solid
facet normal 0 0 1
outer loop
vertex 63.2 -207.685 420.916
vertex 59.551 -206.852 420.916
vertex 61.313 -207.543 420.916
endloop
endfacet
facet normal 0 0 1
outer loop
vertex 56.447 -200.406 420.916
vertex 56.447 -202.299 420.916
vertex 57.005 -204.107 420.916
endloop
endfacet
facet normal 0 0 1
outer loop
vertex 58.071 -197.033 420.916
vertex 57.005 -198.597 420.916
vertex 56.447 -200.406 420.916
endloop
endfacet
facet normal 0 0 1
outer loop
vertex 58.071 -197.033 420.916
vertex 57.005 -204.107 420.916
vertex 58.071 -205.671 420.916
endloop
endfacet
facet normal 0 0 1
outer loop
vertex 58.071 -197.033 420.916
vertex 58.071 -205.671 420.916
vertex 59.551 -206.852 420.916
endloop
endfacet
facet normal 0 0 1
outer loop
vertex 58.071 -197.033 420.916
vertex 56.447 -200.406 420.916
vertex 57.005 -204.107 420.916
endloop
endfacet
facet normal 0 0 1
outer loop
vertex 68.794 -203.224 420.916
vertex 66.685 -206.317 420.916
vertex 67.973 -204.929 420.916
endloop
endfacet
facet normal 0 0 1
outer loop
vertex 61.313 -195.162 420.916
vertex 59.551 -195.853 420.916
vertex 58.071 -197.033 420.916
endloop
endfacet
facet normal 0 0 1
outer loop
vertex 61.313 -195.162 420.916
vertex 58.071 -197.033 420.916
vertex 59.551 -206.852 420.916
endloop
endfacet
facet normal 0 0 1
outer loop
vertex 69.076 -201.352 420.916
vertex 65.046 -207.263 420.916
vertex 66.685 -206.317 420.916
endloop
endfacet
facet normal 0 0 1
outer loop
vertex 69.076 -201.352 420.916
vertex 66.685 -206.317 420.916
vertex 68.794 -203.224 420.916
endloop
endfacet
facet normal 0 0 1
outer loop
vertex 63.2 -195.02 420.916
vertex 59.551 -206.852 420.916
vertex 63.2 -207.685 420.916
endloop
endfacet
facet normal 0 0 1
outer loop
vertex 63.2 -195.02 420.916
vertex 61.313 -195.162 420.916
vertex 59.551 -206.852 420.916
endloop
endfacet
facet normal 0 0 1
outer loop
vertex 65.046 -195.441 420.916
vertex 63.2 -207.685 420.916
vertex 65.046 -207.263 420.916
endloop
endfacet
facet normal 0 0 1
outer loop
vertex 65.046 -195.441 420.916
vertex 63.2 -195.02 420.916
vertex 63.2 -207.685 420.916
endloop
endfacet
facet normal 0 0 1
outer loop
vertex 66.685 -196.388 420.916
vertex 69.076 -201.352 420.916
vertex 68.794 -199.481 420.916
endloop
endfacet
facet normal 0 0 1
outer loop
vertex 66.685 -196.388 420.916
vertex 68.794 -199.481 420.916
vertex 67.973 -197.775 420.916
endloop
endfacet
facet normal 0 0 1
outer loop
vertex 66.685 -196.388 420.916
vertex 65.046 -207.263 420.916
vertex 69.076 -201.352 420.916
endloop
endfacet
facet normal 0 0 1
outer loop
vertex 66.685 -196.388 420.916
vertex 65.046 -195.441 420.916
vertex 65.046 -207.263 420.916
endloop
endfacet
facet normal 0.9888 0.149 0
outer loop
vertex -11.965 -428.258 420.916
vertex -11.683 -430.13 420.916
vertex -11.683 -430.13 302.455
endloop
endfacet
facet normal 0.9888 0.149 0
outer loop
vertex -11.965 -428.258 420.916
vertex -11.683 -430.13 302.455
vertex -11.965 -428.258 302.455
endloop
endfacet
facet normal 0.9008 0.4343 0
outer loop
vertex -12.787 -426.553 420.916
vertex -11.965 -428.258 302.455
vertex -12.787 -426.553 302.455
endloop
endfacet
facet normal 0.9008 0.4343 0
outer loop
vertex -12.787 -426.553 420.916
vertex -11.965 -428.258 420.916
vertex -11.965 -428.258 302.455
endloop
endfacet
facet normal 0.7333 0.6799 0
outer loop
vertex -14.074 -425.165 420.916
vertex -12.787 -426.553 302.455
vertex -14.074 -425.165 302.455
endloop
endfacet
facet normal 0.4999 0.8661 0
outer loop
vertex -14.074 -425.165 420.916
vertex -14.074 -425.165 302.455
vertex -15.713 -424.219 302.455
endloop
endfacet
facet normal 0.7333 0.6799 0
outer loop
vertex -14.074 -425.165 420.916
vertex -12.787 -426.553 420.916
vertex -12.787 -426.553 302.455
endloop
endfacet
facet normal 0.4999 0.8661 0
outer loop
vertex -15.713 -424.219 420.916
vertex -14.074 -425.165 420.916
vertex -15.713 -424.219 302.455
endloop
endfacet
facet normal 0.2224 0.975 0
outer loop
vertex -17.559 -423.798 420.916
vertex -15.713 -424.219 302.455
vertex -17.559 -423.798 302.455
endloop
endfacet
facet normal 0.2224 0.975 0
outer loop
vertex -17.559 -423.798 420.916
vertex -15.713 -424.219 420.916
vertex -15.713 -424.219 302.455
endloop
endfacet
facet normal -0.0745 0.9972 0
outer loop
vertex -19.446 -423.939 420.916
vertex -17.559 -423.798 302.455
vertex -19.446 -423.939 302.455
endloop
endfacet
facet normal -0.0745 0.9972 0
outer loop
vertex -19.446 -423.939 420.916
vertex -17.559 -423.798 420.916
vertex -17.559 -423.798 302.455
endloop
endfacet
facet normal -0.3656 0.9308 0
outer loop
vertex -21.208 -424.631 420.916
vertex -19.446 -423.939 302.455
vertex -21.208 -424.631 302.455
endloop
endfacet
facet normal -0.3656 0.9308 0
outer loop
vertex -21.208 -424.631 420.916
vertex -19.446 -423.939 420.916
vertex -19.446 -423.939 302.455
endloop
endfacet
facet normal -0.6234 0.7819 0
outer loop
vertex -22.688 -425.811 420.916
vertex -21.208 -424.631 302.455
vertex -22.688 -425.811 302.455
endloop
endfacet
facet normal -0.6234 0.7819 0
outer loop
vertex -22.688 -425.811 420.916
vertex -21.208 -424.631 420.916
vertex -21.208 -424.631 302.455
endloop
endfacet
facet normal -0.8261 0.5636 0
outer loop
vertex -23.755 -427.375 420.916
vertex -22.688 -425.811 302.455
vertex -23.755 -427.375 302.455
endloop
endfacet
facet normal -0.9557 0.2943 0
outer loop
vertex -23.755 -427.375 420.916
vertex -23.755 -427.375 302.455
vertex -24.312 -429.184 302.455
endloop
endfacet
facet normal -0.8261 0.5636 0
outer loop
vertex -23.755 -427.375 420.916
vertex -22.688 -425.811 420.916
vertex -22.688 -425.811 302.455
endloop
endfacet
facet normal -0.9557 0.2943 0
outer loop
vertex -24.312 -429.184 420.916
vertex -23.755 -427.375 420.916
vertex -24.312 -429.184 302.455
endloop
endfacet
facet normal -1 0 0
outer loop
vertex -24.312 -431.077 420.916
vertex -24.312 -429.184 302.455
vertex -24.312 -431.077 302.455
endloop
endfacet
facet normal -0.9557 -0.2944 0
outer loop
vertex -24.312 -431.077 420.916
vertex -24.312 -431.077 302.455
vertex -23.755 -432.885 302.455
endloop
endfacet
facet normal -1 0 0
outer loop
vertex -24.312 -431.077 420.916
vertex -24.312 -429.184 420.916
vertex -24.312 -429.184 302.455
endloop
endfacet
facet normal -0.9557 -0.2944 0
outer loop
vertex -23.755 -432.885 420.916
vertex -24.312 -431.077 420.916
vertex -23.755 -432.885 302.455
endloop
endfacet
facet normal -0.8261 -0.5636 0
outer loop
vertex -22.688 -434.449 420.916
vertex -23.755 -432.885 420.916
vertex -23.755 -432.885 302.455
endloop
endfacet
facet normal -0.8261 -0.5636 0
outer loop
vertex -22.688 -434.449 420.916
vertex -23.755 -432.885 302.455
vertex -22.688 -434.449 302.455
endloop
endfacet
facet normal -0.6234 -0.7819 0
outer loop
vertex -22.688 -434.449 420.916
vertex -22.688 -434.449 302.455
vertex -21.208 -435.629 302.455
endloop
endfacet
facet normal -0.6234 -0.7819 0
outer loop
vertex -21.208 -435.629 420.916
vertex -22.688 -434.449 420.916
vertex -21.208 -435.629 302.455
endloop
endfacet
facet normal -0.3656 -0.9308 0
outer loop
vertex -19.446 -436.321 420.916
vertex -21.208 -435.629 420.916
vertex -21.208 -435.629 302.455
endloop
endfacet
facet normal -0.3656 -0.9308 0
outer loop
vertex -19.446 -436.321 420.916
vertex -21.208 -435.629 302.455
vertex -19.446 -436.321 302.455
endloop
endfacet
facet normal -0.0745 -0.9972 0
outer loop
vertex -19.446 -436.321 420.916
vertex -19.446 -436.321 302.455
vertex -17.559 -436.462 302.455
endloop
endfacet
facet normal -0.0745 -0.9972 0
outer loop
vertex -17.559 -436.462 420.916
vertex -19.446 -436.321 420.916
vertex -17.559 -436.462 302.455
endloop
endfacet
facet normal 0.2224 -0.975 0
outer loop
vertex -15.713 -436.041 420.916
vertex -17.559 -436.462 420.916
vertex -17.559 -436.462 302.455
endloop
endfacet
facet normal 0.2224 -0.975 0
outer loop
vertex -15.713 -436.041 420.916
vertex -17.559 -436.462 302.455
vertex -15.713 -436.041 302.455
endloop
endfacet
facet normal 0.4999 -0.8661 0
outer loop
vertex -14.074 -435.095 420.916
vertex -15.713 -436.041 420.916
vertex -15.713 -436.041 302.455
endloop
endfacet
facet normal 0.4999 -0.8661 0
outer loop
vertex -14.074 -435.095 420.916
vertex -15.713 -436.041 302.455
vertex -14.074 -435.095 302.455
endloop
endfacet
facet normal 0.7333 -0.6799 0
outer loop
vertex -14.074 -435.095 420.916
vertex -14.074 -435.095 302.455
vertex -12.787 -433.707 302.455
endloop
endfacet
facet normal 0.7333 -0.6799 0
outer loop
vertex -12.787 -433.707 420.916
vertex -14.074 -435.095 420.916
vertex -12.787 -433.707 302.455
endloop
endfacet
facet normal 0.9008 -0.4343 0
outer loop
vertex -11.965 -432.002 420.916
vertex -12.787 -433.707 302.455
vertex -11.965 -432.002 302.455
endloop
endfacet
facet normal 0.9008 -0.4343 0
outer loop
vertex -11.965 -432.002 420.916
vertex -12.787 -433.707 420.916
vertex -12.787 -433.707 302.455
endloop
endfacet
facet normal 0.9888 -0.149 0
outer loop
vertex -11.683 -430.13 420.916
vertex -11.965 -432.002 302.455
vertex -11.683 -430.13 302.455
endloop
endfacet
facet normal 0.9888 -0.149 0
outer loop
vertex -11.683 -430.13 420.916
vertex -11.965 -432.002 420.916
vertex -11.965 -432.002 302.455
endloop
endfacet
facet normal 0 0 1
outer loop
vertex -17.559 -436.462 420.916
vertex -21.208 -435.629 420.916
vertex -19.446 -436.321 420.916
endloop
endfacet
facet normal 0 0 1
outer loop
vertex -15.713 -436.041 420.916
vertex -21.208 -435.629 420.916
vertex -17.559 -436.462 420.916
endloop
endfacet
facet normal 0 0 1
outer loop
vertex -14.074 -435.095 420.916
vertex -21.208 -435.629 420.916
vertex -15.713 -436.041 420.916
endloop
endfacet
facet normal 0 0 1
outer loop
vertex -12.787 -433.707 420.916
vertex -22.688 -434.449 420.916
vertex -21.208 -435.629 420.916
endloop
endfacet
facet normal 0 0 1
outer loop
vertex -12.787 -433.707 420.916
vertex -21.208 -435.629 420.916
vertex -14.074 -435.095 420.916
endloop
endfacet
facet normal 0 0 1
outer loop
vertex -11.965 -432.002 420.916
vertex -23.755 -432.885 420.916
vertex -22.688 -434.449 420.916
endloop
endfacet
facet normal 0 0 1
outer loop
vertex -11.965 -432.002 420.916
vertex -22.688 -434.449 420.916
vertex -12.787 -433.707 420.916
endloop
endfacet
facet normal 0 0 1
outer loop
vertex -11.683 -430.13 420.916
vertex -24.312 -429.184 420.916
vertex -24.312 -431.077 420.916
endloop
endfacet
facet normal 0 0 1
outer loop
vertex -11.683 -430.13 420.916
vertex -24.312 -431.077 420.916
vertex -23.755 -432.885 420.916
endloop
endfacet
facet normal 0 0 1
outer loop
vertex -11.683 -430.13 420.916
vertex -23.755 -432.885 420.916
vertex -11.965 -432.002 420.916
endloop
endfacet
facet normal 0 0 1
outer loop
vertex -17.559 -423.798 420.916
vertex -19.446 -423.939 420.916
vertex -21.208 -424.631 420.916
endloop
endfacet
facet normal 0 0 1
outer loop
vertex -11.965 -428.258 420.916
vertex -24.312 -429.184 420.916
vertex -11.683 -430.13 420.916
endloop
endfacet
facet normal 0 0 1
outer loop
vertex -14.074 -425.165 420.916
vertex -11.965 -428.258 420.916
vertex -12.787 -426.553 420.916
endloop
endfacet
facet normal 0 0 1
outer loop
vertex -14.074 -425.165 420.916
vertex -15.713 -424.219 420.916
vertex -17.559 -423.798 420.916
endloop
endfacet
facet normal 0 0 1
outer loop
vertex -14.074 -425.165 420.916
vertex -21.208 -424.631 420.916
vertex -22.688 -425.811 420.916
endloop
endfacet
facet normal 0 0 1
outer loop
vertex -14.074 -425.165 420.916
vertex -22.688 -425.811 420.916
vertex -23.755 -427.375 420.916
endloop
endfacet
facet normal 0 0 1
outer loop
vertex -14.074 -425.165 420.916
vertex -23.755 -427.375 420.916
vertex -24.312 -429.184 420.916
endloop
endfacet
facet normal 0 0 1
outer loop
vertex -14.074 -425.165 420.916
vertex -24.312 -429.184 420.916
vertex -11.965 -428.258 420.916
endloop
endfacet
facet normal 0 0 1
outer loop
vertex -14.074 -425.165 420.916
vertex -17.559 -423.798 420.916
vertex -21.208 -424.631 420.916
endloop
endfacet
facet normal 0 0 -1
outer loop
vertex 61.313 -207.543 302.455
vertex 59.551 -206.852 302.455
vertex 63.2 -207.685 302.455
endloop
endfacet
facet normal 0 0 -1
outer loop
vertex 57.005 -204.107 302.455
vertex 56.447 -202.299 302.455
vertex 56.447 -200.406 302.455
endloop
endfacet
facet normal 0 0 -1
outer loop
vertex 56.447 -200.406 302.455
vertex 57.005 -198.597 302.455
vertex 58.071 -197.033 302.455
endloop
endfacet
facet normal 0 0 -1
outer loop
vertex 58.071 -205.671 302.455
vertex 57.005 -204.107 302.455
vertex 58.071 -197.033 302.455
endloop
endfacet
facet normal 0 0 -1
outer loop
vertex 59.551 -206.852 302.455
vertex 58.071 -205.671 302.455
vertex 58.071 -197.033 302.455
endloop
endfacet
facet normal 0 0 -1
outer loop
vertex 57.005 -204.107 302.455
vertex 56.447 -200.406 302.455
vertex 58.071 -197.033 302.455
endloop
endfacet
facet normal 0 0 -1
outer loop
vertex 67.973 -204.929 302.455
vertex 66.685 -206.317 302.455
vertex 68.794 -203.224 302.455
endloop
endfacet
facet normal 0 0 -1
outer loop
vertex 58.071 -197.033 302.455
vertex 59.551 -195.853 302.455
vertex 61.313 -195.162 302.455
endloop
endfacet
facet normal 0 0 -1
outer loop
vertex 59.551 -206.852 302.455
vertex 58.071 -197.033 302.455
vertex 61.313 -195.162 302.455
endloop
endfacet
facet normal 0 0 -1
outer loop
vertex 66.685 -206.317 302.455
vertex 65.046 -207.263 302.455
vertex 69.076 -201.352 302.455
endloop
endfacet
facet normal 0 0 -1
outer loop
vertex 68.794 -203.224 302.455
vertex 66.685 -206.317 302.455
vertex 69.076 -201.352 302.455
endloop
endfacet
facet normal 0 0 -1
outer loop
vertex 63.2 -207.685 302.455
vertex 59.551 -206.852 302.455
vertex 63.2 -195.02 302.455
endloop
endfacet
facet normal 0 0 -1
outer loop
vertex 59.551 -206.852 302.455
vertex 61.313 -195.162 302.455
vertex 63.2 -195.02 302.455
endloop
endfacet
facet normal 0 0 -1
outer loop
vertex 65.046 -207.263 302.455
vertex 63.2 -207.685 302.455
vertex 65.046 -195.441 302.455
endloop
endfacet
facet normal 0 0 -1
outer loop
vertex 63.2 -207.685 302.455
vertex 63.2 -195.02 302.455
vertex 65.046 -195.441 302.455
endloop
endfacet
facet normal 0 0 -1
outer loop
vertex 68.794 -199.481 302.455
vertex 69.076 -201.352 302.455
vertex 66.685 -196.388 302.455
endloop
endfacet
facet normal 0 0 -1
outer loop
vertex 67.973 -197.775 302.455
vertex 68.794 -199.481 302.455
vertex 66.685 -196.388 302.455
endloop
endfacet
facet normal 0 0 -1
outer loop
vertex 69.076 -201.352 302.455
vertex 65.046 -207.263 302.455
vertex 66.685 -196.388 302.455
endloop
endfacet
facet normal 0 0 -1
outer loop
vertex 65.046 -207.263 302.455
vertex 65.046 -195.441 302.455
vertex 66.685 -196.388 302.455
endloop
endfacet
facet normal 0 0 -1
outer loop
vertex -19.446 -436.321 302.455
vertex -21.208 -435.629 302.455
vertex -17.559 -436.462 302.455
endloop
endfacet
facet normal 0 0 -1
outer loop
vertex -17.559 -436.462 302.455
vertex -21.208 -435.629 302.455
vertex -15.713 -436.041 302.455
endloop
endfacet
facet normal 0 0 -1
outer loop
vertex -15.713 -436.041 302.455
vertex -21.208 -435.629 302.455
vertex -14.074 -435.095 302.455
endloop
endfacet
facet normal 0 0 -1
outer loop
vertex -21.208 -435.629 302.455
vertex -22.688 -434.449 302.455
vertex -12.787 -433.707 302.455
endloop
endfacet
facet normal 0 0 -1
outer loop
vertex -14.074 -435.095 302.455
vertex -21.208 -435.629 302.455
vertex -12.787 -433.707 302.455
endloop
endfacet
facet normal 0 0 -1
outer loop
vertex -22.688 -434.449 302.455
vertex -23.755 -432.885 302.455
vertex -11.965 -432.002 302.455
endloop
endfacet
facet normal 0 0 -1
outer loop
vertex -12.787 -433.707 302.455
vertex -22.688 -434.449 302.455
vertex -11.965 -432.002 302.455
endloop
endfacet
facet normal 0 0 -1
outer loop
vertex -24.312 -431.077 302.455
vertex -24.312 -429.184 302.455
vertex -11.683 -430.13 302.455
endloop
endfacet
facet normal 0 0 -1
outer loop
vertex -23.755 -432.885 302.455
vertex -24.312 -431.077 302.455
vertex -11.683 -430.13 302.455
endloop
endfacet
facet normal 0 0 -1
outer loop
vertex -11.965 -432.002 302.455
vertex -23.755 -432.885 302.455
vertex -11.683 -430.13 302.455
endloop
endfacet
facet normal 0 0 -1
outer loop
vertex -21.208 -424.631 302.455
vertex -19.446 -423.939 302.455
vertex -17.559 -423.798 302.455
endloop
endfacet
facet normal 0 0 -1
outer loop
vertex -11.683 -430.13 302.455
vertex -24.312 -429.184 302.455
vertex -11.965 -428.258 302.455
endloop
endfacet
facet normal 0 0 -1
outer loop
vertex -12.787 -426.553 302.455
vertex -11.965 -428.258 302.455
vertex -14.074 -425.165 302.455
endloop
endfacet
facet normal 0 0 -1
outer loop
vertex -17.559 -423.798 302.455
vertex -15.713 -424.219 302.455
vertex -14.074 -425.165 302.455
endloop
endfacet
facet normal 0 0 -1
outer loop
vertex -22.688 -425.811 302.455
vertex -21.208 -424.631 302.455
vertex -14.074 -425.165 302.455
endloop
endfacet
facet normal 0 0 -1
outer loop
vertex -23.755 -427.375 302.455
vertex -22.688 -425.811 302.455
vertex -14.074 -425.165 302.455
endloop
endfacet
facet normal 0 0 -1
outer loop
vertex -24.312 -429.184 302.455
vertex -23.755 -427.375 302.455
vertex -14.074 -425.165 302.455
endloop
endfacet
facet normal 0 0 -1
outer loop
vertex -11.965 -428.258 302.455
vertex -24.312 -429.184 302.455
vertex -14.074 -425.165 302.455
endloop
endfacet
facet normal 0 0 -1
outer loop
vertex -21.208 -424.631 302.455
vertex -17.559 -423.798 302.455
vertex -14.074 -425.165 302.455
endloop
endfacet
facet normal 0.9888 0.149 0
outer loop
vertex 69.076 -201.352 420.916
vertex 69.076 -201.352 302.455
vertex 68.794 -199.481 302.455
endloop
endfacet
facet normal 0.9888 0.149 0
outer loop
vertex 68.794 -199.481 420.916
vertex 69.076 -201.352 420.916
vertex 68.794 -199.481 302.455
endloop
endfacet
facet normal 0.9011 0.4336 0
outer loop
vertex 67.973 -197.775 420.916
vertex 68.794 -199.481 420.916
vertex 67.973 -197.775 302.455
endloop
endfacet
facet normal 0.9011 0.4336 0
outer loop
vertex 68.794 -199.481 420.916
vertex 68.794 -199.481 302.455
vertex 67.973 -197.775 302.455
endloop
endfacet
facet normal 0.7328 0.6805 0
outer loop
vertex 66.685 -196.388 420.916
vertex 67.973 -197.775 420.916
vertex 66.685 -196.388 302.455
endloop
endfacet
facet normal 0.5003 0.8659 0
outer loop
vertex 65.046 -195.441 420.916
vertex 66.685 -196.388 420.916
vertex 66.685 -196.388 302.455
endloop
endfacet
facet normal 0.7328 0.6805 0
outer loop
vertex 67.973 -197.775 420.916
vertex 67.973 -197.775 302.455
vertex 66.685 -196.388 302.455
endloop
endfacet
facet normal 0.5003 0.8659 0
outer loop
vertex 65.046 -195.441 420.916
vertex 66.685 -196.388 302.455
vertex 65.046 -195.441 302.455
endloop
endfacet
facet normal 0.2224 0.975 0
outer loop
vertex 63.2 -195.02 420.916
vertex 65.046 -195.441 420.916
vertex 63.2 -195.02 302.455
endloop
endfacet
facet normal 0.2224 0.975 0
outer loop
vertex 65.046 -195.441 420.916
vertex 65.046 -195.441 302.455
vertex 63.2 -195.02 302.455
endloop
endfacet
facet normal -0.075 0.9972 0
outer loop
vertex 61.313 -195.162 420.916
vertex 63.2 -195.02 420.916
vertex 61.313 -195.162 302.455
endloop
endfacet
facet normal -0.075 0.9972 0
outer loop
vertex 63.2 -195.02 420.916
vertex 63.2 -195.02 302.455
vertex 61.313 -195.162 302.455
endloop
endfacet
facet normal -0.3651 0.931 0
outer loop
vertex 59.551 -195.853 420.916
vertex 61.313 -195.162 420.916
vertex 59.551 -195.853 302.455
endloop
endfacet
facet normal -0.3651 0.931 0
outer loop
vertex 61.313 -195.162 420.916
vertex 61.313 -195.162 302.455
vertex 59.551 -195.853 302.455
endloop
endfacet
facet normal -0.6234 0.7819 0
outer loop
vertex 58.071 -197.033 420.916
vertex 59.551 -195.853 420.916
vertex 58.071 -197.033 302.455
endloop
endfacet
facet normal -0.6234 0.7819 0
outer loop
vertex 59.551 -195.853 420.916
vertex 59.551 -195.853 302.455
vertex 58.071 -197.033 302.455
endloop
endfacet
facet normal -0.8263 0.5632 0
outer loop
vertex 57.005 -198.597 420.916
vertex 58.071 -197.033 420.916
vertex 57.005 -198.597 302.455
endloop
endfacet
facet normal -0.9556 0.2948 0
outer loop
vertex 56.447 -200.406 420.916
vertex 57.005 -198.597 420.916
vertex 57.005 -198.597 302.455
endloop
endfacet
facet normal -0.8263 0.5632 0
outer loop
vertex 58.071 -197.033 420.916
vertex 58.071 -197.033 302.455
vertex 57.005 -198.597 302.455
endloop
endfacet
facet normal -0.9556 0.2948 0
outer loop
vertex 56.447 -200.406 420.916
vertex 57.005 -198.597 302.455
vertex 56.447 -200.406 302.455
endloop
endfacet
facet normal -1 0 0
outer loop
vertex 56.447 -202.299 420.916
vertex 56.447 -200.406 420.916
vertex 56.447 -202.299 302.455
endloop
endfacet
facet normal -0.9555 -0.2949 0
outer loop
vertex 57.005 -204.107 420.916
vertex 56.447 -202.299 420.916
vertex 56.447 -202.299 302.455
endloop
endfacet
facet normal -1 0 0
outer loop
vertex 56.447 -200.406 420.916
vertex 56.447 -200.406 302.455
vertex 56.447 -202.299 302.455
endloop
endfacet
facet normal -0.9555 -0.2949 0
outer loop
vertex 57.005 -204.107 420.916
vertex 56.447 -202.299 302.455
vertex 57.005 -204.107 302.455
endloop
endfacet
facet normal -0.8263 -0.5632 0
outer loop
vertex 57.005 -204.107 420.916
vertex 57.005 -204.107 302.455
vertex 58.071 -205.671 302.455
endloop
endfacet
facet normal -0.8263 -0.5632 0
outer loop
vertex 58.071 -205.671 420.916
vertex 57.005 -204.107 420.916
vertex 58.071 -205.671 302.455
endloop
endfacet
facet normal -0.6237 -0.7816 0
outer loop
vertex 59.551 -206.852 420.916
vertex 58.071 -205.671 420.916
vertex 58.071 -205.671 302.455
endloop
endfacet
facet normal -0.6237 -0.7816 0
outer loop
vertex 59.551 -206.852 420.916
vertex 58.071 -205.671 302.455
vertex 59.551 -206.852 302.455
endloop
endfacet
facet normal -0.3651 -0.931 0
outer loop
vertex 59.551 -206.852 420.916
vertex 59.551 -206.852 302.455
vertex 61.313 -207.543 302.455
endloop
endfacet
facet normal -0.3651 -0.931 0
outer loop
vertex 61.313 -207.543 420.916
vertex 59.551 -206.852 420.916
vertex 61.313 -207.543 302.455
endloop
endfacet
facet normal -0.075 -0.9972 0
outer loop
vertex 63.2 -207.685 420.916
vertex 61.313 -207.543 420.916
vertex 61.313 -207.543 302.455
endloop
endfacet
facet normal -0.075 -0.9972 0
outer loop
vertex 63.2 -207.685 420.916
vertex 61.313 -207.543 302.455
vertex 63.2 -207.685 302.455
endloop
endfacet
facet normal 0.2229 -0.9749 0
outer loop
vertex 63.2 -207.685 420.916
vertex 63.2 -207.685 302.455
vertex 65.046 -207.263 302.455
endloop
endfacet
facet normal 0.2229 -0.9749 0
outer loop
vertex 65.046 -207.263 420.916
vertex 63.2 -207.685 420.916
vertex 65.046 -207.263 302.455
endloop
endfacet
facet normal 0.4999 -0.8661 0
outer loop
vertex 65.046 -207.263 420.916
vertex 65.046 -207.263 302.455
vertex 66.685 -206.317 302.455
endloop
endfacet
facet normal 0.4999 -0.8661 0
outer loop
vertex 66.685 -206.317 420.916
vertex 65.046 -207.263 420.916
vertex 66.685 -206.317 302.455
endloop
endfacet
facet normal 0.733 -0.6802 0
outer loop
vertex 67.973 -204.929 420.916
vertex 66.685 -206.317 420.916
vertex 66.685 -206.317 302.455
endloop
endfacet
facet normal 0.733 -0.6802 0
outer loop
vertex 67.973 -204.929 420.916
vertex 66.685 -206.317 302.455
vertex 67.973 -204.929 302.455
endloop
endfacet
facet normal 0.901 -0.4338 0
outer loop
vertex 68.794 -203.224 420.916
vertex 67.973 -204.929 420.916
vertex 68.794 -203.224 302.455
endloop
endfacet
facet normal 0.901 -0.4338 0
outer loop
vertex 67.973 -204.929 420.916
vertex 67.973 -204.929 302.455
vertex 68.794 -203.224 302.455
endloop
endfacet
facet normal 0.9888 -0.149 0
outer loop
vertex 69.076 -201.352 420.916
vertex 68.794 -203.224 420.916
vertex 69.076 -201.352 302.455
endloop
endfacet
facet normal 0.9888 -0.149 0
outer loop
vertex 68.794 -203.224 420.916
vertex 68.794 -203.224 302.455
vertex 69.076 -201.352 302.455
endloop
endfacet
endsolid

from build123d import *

# Parameters (mm, degrees)
BOSS_EXTRUDE1_START     = -118.461205854
BOSS_EXTRUDE1_OUTLINE_R = 6.35
BOSS_EXTRUDE1_DEPTH     = 118.461205854
SKETCH3_R               = 6.35
BOSS_EXTRUDE2_DEPTH     = 118.461205854


# Read off the part's stored shape, not the designer's step: Boss-Extrude1
with BuildPart() as part:
    # Boss-Extrude1 outline → Boss-Extrude1 (new body)
    with BuildSketch(Plane.XY.offset(420.9161).offset(BOSS_EXTRUDE1_START)):
        with Locations((62.725916196, -201.352329346)):
            Circle(BOSS_EXTRUDE1_OUTLINE_R)
    extrude(amount=BOSS_EXTRUDE1_DEPTH)


with BuildPart() as body_2:
    # Sketch3 → Boss-Extrude2 (new body)
    with BuildSketch(Plane.XY.offset(420.9161)):
        with Locations((-18.033383804, -430.130129346)):
            Circle(SKETCH3_R)
    extrude(amount=-BOSS_EXTRUDE2_DEPTH)


solid = Compound([part.part, body_2.part])
